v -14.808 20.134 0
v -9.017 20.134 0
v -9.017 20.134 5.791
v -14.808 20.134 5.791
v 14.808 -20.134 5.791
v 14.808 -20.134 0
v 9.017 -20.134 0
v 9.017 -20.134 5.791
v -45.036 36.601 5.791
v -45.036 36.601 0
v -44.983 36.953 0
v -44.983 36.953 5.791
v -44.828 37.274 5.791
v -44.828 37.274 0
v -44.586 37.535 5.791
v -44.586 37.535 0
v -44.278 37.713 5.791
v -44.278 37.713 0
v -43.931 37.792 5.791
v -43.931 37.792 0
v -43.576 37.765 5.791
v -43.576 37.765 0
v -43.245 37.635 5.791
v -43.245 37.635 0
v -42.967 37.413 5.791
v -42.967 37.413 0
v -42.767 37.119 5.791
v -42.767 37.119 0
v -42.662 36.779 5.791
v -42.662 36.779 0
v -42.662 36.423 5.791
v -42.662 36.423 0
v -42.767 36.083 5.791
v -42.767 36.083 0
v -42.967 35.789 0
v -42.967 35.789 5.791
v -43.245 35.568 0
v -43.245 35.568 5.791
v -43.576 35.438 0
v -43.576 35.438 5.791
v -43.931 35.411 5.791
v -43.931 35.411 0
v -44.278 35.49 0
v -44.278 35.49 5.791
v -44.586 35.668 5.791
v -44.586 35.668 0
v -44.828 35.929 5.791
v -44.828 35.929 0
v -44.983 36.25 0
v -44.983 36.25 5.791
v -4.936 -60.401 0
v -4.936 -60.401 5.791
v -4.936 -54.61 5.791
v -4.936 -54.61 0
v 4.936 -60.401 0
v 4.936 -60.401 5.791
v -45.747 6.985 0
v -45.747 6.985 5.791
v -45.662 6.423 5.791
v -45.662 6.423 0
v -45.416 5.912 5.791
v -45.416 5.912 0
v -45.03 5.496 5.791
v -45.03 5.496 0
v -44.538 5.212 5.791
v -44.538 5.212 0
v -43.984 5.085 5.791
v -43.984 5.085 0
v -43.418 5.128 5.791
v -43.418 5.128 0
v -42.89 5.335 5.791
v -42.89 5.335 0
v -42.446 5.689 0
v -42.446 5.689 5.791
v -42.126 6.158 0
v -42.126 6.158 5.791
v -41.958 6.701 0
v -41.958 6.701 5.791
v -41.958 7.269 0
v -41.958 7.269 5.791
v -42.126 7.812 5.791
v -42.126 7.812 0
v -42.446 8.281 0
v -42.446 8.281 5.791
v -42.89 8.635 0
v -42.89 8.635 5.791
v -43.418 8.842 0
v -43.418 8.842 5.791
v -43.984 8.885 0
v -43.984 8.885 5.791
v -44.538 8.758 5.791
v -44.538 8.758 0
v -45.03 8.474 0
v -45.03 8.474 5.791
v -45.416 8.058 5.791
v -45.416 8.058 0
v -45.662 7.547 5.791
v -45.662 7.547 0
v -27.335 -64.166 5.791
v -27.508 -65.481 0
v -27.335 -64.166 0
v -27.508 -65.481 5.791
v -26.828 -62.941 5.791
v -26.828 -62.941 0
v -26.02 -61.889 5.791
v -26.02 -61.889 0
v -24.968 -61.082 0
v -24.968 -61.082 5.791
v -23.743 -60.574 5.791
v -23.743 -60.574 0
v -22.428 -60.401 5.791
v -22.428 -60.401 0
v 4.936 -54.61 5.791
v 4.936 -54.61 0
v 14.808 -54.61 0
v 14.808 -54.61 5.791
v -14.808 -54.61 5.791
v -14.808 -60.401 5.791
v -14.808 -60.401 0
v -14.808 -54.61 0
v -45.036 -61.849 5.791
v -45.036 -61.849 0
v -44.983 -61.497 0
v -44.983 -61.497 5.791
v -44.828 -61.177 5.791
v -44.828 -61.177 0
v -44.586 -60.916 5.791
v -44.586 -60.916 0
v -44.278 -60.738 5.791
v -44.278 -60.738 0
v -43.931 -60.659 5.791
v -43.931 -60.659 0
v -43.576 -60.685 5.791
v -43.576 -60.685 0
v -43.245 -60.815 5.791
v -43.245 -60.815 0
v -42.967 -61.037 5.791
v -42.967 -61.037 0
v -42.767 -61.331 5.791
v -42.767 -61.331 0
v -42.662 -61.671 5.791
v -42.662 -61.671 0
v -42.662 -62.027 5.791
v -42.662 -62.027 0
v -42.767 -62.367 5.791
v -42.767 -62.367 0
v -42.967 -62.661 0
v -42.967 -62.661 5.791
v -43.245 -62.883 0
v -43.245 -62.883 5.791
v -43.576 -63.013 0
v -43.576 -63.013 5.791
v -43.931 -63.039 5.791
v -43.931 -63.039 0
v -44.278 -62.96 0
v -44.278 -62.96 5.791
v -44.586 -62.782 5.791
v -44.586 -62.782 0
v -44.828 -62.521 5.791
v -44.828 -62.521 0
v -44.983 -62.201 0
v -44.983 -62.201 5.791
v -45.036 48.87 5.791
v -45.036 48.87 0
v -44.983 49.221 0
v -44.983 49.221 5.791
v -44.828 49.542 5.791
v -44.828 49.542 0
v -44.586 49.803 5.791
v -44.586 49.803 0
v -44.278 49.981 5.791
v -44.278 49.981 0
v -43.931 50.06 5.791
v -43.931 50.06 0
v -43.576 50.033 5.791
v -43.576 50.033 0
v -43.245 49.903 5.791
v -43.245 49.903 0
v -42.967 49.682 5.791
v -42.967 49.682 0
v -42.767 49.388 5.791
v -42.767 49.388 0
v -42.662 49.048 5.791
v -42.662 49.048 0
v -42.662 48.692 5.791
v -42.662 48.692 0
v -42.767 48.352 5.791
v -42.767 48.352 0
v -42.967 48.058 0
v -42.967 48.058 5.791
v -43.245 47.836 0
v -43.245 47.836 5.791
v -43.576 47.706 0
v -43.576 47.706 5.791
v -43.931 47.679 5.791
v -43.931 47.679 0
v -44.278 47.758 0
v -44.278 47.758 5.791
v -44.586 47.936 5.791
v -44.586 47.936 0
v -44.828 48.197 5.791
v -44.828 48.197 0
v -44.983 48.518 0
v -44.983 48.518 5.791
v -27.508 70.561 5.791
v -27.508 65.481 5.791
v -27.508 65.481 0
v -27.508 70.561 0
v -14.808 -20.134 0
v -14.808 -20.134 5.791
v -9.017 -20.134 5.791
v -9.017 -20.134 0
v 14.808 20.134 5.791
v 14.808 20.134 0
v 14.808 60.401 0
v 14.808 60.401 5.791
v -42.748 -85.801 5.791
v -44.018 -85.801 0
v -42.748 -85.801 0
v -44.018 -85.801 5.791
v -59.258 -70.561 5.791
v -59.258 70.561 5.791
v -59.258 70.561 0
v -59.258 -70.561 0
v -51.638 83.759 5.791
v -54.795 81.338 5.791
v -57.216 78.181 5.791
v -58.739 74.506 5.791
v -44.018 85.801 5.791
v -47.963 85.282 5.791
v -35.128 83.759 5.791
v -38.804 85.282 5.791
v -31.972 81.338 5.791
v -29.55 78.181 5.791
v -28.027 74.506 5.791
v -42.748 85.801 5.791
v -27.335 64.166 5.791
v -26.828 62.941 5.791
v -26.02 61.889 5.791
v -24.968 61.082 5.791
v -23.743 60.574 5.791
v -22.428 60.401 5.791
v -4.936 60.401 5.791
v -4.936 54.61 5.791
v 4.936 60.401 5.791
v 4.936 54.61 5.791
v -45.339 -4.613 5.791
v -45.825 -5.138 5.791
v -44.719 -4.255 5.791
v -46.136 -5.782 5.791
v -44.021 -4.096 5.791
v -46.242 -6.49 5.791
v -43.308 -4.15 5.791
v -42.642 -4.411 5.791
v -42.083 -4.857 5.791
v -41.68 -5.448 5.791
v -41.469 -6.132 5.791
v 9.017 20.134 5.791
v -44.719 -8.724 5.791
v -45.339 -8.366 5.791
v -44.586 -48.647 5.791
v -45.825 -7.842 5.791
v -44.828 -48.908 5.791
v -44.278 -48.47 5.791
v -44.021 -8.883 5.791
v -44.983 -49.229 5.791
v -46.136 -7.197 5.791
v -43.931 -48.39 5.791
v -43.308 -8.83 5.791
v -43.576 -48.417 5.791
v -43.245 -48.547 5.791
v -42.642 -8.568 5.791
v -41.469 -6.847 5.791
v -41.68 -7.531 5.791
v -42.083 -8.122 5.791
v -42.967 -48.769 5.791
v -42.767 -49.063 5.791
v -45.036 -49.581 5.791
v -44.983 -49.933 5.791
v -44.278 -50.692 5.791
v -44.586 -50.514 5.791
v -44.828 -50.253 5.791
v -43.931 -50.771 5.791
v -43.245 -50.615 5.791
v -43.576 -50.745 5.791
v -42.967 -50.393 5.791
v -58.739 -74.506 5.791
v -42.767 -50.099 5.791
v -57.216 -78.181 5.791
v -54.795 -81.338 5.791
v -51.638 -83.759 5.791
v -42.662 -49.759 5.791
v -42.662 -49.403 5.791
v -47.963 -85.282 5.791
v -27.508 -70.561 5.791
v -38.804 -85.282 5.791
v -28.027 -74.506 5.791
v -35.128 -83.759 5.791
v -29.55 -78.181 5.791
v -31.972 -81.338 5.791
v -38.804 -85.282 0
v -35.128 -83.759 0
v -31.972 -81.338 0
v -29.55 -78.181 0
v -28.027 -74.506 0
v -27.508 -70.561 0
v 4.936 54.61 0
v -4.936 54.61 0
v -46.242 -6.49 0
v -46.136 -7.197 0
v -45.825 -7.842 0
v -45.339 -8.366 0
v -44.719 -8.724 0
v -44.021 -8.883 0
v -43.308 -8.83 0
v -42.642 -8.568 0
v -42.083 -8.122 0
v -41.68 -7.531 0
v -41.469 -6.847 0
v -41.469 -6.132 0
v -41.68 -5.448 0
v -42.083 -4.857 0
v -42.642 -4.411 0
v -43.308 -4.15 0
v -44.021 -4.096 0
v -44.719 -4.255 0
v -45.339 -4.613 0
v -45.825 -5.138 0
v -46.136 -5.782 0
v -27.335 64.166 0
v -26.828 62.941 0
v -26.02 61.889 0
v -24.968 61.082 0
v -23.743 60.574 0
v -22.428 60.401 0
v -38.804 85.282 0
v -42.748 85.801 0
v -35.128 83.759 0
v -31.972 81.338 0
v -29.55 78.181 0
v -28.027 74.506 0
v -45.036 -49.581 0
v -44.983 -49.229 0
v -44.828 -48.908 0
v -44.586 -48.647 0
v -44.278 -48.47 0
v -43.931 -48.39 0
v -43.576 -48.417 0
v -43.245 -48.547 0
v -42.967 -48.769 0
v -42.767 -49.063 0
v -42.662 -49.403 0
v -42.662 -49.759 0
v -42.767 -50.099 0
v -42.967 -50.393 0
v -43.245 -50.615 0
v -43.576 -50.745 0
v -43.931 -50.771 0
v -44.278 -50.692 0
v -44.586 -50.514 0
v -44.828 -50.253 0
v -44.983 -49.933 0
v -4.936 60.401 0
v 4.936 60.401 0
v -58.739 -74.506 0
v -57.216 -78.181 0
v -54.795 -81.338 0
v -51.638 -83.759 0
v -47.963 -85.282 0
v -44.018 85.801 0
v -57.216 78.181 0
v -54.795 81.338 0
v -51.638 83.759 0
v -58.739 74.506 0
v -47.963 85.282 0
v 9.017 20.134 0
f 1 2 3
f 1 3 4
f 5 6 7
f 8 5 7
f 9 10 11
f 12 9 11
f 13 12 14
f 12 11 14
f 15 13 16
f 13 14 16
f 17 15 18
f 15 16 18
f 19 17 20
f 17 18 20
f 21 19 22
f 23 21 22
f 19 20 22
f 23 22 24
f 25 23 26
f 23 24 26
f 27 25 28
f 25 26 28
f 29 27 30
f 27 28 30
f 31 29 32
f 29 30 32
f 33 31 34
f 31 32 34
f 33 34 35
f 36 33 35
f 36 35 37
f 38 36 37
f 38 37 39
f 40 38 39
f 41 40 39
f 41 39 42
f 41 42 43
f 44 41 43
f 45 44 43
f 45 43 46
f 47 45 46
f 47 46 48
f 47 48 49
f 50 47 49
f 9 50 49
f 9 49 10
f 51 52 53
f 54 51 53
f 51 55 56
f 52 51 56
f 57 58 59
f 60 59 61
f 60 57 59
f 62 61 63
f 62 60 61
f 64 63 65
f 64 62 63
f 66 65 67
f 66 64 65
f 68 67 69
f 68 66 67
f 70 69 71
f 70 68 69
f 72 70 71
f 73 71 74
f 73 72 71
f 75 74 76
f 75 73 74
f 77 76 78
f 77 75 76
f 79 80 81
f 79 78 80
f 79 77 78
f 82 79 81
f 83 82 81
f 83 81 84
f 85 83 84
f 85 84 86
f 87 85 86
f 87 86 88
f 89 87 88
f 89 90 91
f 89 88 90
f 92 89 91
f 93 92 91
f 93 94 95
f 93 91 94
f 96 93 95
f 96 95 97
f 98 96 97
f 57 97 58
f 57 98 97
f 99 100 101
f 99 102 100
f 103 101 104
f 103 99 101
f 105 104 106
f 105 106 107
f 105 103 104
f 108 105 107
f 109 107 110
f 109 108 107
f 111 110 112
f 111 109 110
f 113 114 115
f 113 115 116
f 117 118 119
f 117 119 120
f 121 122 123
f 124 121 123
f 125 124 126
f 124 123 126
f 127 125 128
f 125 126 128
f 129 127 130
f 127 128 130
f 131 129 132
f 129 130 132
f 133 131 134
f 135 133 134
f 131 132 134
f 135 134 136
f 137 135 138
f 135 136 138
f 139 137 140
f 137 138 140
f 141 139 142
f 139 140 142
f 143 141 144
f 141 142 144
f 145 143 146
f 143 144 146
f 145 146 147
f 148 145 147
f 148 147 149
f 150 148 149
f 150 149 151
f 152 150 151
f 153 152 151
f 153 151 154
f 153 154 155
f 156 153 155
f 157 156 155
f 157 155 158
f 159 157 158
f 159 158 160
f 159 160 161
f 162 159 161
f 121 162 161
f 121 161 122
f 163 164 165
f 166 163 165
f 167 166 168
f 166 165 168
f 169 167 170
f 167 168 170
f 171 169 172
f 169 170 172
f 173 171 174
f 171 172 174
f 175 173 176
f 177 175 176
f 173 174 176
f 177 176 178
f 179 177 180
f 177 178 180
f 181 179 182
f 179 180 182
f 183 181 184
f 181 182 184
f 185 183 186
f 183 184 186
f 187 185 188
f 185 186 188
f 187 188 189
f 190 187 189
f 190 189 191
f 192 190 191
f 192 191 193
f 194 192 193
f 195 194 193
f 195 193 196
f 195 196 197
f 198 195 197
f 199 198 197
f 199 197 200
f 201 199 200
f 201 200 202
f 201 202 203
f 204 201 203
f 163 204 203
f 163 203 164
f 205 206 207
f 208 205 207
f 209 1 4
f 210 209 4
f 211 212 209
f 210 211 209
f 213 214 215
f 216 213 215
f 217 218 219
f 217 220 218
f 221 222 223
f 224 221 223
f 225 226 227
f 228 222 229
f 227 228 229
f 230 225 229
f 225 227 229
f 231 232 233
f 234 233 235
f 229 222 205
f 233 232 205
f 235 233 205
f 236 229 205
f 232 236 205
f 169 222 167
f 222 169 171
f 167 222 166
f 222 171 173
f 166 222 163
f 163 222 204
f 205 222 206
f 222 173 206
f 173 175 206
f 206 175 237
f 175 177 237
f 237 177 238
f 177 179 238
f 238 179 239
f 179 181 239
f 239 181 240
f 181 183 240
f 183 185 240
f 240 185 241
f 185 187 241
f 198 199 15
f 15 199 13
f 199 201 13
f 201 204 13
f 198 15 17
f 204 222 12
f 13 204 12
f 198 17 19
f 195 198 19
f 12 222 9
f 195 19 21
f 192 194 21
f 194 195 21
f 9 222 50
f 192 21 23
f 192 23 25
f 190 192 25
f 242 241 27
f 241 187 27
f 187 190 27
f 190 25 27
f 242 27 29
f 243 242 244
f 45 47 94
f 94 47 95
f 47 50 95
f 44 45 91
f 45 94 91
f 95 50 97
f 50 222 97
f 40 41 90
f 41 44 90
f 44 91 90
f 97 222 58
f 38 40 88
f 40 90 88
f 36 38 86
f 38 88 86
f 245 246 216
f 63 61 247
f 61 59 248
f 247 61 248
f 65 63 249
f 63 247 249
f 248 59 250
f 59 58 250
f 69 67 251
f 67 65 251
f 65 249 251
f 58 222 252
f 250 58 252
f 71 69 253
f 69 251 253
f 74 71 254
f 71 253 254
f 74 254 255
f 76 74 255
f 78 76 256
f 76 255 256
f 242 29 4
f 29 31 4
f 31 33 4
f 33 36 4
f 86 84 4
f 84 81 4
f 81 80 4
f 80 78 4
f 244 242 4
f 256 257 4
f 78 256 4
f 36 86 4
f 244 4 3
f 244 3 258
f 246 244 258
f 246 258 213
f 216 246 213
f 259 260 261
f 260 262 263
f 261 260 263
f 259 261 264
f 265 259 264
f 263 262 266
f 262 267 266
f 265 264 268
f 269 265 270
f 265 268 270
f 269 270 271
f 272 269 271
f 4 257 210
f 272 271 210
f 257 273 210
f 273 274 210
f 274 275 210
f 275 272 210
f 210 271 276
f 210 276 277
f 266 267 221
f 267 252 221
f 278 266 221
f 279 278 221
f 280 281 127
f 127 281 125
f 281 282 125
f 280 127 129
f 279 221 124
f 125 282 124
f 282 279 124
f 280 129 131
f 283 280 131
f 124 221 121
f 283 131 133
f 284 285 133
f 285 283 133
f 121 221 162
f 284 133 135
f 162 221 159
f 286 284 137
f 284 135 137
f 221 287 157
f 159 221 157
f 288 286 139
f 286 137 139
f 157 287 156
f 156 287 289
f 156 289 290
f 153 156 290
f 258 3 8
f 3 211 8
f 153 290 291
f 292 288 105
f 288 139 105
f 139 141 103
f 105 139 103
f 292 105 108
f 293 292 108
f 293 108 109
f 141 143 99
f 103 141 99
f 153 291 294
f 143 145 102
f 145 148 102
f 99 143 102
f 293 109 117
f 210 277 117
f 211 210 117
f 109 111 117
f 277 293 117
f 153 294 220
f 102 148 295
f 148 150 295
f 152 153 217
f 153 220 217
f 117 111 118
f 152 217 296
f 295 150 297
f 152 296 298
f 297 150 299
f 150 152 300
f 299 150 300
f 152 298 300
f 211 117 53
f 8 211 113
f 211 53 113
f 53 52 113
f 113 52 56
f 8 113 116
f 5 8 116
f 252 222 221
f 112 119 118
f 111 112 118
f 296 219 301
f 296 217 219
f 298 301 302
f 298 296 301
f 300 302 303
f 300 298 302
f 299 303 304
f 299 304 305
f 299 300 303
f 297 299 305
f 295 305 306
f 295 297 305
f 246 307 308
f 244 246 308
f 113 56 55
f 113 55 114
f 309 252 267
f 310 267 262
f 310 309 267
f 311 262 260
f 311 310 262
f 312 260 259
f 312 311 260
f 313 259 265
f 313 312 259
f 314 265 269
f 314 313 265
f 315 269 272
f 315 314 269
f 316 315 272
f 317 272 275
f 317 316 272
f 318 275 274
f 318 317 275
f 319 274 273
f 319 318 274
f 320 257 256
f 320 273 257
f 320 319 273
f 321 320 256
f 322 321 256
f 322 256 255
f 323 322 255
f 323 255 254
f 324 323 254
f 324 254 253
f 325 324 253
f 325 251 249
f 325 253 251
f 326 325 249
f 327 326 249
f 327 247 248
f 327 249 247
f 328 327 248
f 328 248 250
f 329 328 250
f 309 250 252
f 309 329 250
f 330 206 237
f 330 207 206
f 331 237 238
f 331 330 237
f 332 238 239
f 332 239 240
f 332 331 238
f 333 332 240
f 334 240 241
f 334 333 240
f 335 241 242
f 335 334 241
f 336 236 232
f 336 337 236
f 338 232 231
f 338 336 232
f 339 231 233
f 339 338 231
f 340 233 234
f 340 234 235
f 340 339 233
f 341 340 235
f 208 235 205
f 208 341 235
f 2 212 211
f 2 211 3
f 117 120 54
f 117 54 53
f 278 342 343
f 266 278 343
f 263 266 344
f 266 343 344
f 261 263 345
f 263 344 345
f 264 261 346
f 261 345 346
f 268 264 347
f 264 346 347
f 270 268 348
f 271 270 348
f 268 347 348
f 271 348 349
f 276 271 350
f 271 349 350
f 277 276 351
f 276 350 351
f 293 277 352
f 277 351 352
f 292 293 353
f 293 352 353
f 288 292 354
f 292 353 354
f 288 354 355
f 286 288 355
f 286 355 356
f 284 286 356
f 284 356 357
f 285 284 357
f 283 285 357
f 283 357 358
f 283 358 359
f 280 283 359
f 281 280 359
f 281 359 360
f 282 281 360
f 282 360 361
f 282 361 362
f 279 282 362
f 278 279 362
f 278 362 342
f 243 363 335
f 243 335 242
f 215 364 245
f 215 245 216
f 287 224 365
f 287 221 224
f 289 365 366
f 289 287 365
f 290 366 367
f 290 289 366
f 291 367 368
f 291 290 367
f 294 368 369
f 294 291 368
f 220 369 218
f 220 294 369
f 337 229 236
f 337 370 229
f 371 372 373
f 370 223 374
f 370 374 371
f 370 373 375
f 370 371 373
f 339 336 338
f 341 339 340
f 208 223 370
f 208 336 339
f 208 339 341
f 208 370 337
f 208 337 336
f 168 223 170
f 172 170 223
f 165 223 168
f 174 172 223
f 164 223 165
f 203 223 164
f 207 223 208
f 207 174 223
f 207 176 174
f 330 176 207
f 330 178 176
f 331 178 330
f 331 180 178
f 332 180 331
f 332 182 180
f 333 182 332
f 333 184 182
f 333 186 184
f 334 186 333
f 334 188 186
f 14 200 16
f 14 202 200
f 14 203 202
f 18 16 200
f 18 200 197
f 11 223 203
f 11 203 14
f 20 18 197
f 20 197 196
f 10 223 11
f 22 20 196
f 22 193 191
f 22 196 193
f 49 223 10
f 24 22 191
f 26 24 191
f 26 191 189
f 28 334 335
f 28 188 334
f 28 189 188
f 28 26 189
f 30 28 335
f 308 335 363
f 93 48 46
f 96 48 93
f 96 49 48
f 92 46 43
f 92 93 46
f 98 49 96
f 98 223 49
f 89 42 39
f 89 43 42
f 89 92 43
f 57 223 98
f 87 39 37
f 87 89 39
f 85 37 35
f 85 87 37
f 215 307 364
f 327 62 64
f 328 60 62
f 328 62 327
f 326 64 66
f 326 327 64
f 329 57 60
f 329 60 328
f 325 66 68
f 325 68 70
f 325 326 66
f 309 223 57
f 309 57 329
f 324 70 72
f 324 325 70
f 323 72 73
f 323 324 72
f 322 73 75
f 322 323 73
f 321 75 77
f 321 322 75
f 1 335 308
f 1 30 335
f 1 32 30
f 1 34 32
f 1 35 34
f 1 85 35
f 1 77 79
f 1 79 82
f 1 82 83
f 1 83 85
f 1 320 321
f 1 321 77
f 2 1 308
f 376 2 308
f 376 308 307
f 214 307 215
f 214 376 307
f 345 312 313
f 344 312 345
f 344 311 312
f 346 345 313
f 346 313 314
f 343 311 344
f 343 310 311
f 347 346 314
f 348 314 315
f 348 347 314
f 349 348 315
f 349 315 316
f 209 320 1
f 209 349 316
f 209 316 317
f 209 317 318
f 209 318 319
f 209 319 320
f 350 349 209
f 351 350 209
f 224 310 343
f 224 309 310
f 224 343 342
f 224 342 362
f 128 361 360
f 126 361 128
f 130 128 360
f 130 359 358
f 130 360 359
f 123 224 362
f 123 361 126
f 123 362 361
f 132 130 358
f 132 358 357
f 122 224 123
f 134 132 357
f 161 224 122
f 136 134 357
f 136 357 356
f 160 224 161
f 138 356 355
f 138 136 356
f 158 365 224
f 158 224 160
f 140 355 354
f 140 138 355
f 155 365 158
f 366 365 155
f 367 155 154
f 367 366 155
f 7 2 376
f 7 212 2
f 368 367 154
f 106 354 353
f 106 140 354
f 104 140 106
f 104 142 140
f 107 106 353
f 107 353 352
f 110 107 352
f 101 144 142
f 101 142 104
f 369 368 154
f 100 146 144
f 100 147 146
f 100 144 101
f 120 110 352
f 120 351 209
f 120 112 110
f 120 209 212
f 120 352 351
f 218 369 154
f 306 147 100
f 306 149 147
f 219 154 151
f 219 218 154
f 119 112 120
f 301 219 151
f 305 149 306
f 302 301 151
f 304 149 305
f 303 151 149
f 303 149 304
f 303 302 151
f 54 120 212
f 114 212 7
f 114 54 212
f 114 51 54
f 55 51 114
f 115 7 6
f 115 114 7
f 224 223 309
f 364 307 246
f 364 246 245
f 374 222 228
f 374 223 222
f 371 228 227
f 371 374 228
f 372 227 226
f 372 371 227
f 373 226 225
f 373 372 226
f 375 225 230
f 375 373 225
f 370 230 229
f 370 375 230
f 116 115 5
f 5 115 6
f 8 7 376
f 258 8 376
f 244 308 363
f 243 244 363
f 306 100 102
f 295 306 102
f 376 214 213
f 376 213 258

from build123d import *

# Parameters (mm, degrees)
SKETCH1_W           = 29.6164
SKETCH1_H           = 120.8024
BOSS_EXTRUDE1_DEPTH = 5.7912
SKETCH3_W           = 5.7912
SKETCH3_H           = 40.267466666
CUT_EXTRUDE2_DEPTH  = 63.458992516
SKETCH6_W           = 9.872133334
SKETCH6_H           = 5.7912
CUT_EXTRUDE5_DEPTH  = 63.458992516
SKETCH9_W           = 5.7912
SKETCH9_H           = 120.8024
BOSS_EXTRUDE3_DEPTH = 44.45
SKETCH13_W          = 31.75
SKETCH13_H          = 5.7912
BOSS_EXTRUDE4_DEPTH = 25.4
SKETCH14_W          = 31.75
SKETCH14_H          = 5.7912
BOSS_EXTRUDE5_DEPTH = 25.4
SKETCH16_R          = 2.4003
SKETCH16_R_2        = 1.905
CUT_EXTRUDE8_DEPTH  = 13.462
SKETCH18_R          = 1.1938
CUT_EXTRUDE9_DEPTH  = 105.436191936
FILLET2_R           = 15.24
FILLET3_R           = 5.08
CAVITY1_START       = -14.8082
CAVITY1_OUTLINE_W   = 5.7912
CAVITY1_OUTLINE_H   = 5.7912
CAVITY1_DEPTH       = 9.872133333
CAVITY1_START_2     = 4.936066667
CAVITY1_2_OUTLINE_W = 5.7912
CAVITY1_2_OUTLINE_H = 5.7912
CAVITY1_2_DEPTH     = 9.872133333


# Read off the part's stored shape, not the designer's step: Cavity1
with BuildPart() as part:
    # Sketch1 → Boss-Extrude1 (new body)
    with BuildSketch(Plane.XY):
        Rectangle(SKETCH1_W, SKETCH1_H)
    extrude(amount=BOSS_EXTRUDE1_DEPTH)

    # Sketch3 → Cut-Extrude2 (cut, through all)
    with BuildSketch(Plane(origin=(0, 0, 0), x_dir=(-1, 0, 0), z_dir=(0, 0, -1))):
        with Locations((-11.9126, 0)):
            Rectangle(SKETCH3_W, SKETCH3_H)
        with Locations((11.9126, 0)):
            Rectangle(SKETCH3_W, SKETCH3_H)
    extrude(amount=-CUT_EXTRUDE2_DEPTH, mode=Mode.SUBTRACT)

    # Sketch6 → Cut-Extrude5 (cut, through all)
    with BuildSketch(Plane(origin=(0, 0, 0), x_dir=(-1, 0, 0), z_dir=(0, 0, -1))):
        with Locations((0, 57.5056)):
            Rectangle(SKETCH6_W, SKETCH6_H)
    extrude(amount=-CUT_EXTRUDE5_DEPTH, mode=Mode.SUBTRACT)

    # Sketch9 → Boss-Extrude3 (add)
    with BuildSketch(Plane.ZY.offset(14.8082)):
        with Locations((2.8956, 0)):
            Rectangle(SKETCH9_W, SKETCH9_H)
    extrude(amount=BOSS_EXTRUDE3_DEPTH)

    # Sketch13 → Boss-Extrude4 (add)
    with BuildSketch(Plane.XZ.offset(60.4012)):
        with Locations((-43.3832, 2.8956)):
            Rectangle(SKETCH13_W, SKETCH13_H)
    extrude(amount=BOSS_EXTRUDE4_DEPTH)

    # Sketch14 → Boss-Extrude5 (add)
    with BuildSketch(Plane(origin=(0, 60.4012, 0), x_dir=(1, 0, 0), z_dir=(0, 1, 0))):
        with Locations((-43.3832, -2.8956)):
            Rectangle(SKETCH14_W, SKETCH14_H)
    extrude(amount=BOSS_EXTRUDE5_DEPTH)

    # Sketch16 → Cut-Extrude8 (cut)
    with BuildSketch(Plane.XY):
        with Locations(Location((-43.842108599, -6.4897, 0), (0, 0, 180))):
            Circle(SKETCH16_R)
        with Locations(Location((-43.842108599, 6.985, 0), (0, 0, 180))):
            Circle(SKETCH16_R_2)
    extrude(amount=CUT_EXTRUDE8_DEPTH, mode=Mode.SUBTRACT)

    # Sketch18 → Cut-Extrude9 (cut, through all)
    with BuildSketch(Plane(origin=(0, 0, 0), x_dir=(-1, 0, 0), z_dir=(0, 0, -1))):
        with Locations((43.842108599, 48.8696)):
            Circle(SKETCH18_R)
        with Locations((43.842108599, 36.6014)):
            Circle(SKETCH18_R)
        with Locations((43.842108599, -49.5808)):
            Circle(SKETCH18_R)
        with Locations((43.842108599, -61.849)):
            Circle(SKETCH18_R)
    extrude(amount=-CUT_EXTRUDE9_DEPTH, mode=Mode.SUBTRACT)

    # Fillet2
    fillet2_edges = [part.edges().sort_by_distance(p)[0] for p in [
        (-27.5082, 85.8012, 2.8956),
        (-27.5082, -85.8012, 2.8956),
        (-59.2582, 85.8012, 2.8956),
        (-59.2582, -85.8012, 2.8956),
    ]]
    fillet(fillet2_edges, radius=FILLET2_R)

    # Fillet3
    fillet3_edges = [part.edges().sort_by_distance(p)[0] for p in [
        (-27.5082, -60.4012, 2.8956),
        (-27.5082, 60.4012, 2.8956),
    ]]
    fillet(fillet3_edges, radius=FILLET3_R)

    # Cavity1 outline → Cavity1 (cut)
    with BuildSketch(Plane.YZ.offset(CAVITY1_START)):
        with Locations((-57.5056, 2.8956)):
            Rectangle(CAVITY1_OUTLINE_W, CAVITY1_OUTLINE_H)
    extrude(amount=CAVITY1_DEPTH, mode=Mode.SUBTRACT)

    # Cavity1 2 outline → Cavity1 2 (cut)
    with BuildSketch(Plane.YZ.offset(CAVITY1_START_2)):
        with Locations((-57.5056, 2.8956)):
            Rectangle(CAVITY1_2_OUTLINE_W, CAVITY1_2_OUTLINE_H)
    extrude(amount=CAVITY1_2_DEPTH, mode=Mode.SUBTRACT)


solid = part.part
